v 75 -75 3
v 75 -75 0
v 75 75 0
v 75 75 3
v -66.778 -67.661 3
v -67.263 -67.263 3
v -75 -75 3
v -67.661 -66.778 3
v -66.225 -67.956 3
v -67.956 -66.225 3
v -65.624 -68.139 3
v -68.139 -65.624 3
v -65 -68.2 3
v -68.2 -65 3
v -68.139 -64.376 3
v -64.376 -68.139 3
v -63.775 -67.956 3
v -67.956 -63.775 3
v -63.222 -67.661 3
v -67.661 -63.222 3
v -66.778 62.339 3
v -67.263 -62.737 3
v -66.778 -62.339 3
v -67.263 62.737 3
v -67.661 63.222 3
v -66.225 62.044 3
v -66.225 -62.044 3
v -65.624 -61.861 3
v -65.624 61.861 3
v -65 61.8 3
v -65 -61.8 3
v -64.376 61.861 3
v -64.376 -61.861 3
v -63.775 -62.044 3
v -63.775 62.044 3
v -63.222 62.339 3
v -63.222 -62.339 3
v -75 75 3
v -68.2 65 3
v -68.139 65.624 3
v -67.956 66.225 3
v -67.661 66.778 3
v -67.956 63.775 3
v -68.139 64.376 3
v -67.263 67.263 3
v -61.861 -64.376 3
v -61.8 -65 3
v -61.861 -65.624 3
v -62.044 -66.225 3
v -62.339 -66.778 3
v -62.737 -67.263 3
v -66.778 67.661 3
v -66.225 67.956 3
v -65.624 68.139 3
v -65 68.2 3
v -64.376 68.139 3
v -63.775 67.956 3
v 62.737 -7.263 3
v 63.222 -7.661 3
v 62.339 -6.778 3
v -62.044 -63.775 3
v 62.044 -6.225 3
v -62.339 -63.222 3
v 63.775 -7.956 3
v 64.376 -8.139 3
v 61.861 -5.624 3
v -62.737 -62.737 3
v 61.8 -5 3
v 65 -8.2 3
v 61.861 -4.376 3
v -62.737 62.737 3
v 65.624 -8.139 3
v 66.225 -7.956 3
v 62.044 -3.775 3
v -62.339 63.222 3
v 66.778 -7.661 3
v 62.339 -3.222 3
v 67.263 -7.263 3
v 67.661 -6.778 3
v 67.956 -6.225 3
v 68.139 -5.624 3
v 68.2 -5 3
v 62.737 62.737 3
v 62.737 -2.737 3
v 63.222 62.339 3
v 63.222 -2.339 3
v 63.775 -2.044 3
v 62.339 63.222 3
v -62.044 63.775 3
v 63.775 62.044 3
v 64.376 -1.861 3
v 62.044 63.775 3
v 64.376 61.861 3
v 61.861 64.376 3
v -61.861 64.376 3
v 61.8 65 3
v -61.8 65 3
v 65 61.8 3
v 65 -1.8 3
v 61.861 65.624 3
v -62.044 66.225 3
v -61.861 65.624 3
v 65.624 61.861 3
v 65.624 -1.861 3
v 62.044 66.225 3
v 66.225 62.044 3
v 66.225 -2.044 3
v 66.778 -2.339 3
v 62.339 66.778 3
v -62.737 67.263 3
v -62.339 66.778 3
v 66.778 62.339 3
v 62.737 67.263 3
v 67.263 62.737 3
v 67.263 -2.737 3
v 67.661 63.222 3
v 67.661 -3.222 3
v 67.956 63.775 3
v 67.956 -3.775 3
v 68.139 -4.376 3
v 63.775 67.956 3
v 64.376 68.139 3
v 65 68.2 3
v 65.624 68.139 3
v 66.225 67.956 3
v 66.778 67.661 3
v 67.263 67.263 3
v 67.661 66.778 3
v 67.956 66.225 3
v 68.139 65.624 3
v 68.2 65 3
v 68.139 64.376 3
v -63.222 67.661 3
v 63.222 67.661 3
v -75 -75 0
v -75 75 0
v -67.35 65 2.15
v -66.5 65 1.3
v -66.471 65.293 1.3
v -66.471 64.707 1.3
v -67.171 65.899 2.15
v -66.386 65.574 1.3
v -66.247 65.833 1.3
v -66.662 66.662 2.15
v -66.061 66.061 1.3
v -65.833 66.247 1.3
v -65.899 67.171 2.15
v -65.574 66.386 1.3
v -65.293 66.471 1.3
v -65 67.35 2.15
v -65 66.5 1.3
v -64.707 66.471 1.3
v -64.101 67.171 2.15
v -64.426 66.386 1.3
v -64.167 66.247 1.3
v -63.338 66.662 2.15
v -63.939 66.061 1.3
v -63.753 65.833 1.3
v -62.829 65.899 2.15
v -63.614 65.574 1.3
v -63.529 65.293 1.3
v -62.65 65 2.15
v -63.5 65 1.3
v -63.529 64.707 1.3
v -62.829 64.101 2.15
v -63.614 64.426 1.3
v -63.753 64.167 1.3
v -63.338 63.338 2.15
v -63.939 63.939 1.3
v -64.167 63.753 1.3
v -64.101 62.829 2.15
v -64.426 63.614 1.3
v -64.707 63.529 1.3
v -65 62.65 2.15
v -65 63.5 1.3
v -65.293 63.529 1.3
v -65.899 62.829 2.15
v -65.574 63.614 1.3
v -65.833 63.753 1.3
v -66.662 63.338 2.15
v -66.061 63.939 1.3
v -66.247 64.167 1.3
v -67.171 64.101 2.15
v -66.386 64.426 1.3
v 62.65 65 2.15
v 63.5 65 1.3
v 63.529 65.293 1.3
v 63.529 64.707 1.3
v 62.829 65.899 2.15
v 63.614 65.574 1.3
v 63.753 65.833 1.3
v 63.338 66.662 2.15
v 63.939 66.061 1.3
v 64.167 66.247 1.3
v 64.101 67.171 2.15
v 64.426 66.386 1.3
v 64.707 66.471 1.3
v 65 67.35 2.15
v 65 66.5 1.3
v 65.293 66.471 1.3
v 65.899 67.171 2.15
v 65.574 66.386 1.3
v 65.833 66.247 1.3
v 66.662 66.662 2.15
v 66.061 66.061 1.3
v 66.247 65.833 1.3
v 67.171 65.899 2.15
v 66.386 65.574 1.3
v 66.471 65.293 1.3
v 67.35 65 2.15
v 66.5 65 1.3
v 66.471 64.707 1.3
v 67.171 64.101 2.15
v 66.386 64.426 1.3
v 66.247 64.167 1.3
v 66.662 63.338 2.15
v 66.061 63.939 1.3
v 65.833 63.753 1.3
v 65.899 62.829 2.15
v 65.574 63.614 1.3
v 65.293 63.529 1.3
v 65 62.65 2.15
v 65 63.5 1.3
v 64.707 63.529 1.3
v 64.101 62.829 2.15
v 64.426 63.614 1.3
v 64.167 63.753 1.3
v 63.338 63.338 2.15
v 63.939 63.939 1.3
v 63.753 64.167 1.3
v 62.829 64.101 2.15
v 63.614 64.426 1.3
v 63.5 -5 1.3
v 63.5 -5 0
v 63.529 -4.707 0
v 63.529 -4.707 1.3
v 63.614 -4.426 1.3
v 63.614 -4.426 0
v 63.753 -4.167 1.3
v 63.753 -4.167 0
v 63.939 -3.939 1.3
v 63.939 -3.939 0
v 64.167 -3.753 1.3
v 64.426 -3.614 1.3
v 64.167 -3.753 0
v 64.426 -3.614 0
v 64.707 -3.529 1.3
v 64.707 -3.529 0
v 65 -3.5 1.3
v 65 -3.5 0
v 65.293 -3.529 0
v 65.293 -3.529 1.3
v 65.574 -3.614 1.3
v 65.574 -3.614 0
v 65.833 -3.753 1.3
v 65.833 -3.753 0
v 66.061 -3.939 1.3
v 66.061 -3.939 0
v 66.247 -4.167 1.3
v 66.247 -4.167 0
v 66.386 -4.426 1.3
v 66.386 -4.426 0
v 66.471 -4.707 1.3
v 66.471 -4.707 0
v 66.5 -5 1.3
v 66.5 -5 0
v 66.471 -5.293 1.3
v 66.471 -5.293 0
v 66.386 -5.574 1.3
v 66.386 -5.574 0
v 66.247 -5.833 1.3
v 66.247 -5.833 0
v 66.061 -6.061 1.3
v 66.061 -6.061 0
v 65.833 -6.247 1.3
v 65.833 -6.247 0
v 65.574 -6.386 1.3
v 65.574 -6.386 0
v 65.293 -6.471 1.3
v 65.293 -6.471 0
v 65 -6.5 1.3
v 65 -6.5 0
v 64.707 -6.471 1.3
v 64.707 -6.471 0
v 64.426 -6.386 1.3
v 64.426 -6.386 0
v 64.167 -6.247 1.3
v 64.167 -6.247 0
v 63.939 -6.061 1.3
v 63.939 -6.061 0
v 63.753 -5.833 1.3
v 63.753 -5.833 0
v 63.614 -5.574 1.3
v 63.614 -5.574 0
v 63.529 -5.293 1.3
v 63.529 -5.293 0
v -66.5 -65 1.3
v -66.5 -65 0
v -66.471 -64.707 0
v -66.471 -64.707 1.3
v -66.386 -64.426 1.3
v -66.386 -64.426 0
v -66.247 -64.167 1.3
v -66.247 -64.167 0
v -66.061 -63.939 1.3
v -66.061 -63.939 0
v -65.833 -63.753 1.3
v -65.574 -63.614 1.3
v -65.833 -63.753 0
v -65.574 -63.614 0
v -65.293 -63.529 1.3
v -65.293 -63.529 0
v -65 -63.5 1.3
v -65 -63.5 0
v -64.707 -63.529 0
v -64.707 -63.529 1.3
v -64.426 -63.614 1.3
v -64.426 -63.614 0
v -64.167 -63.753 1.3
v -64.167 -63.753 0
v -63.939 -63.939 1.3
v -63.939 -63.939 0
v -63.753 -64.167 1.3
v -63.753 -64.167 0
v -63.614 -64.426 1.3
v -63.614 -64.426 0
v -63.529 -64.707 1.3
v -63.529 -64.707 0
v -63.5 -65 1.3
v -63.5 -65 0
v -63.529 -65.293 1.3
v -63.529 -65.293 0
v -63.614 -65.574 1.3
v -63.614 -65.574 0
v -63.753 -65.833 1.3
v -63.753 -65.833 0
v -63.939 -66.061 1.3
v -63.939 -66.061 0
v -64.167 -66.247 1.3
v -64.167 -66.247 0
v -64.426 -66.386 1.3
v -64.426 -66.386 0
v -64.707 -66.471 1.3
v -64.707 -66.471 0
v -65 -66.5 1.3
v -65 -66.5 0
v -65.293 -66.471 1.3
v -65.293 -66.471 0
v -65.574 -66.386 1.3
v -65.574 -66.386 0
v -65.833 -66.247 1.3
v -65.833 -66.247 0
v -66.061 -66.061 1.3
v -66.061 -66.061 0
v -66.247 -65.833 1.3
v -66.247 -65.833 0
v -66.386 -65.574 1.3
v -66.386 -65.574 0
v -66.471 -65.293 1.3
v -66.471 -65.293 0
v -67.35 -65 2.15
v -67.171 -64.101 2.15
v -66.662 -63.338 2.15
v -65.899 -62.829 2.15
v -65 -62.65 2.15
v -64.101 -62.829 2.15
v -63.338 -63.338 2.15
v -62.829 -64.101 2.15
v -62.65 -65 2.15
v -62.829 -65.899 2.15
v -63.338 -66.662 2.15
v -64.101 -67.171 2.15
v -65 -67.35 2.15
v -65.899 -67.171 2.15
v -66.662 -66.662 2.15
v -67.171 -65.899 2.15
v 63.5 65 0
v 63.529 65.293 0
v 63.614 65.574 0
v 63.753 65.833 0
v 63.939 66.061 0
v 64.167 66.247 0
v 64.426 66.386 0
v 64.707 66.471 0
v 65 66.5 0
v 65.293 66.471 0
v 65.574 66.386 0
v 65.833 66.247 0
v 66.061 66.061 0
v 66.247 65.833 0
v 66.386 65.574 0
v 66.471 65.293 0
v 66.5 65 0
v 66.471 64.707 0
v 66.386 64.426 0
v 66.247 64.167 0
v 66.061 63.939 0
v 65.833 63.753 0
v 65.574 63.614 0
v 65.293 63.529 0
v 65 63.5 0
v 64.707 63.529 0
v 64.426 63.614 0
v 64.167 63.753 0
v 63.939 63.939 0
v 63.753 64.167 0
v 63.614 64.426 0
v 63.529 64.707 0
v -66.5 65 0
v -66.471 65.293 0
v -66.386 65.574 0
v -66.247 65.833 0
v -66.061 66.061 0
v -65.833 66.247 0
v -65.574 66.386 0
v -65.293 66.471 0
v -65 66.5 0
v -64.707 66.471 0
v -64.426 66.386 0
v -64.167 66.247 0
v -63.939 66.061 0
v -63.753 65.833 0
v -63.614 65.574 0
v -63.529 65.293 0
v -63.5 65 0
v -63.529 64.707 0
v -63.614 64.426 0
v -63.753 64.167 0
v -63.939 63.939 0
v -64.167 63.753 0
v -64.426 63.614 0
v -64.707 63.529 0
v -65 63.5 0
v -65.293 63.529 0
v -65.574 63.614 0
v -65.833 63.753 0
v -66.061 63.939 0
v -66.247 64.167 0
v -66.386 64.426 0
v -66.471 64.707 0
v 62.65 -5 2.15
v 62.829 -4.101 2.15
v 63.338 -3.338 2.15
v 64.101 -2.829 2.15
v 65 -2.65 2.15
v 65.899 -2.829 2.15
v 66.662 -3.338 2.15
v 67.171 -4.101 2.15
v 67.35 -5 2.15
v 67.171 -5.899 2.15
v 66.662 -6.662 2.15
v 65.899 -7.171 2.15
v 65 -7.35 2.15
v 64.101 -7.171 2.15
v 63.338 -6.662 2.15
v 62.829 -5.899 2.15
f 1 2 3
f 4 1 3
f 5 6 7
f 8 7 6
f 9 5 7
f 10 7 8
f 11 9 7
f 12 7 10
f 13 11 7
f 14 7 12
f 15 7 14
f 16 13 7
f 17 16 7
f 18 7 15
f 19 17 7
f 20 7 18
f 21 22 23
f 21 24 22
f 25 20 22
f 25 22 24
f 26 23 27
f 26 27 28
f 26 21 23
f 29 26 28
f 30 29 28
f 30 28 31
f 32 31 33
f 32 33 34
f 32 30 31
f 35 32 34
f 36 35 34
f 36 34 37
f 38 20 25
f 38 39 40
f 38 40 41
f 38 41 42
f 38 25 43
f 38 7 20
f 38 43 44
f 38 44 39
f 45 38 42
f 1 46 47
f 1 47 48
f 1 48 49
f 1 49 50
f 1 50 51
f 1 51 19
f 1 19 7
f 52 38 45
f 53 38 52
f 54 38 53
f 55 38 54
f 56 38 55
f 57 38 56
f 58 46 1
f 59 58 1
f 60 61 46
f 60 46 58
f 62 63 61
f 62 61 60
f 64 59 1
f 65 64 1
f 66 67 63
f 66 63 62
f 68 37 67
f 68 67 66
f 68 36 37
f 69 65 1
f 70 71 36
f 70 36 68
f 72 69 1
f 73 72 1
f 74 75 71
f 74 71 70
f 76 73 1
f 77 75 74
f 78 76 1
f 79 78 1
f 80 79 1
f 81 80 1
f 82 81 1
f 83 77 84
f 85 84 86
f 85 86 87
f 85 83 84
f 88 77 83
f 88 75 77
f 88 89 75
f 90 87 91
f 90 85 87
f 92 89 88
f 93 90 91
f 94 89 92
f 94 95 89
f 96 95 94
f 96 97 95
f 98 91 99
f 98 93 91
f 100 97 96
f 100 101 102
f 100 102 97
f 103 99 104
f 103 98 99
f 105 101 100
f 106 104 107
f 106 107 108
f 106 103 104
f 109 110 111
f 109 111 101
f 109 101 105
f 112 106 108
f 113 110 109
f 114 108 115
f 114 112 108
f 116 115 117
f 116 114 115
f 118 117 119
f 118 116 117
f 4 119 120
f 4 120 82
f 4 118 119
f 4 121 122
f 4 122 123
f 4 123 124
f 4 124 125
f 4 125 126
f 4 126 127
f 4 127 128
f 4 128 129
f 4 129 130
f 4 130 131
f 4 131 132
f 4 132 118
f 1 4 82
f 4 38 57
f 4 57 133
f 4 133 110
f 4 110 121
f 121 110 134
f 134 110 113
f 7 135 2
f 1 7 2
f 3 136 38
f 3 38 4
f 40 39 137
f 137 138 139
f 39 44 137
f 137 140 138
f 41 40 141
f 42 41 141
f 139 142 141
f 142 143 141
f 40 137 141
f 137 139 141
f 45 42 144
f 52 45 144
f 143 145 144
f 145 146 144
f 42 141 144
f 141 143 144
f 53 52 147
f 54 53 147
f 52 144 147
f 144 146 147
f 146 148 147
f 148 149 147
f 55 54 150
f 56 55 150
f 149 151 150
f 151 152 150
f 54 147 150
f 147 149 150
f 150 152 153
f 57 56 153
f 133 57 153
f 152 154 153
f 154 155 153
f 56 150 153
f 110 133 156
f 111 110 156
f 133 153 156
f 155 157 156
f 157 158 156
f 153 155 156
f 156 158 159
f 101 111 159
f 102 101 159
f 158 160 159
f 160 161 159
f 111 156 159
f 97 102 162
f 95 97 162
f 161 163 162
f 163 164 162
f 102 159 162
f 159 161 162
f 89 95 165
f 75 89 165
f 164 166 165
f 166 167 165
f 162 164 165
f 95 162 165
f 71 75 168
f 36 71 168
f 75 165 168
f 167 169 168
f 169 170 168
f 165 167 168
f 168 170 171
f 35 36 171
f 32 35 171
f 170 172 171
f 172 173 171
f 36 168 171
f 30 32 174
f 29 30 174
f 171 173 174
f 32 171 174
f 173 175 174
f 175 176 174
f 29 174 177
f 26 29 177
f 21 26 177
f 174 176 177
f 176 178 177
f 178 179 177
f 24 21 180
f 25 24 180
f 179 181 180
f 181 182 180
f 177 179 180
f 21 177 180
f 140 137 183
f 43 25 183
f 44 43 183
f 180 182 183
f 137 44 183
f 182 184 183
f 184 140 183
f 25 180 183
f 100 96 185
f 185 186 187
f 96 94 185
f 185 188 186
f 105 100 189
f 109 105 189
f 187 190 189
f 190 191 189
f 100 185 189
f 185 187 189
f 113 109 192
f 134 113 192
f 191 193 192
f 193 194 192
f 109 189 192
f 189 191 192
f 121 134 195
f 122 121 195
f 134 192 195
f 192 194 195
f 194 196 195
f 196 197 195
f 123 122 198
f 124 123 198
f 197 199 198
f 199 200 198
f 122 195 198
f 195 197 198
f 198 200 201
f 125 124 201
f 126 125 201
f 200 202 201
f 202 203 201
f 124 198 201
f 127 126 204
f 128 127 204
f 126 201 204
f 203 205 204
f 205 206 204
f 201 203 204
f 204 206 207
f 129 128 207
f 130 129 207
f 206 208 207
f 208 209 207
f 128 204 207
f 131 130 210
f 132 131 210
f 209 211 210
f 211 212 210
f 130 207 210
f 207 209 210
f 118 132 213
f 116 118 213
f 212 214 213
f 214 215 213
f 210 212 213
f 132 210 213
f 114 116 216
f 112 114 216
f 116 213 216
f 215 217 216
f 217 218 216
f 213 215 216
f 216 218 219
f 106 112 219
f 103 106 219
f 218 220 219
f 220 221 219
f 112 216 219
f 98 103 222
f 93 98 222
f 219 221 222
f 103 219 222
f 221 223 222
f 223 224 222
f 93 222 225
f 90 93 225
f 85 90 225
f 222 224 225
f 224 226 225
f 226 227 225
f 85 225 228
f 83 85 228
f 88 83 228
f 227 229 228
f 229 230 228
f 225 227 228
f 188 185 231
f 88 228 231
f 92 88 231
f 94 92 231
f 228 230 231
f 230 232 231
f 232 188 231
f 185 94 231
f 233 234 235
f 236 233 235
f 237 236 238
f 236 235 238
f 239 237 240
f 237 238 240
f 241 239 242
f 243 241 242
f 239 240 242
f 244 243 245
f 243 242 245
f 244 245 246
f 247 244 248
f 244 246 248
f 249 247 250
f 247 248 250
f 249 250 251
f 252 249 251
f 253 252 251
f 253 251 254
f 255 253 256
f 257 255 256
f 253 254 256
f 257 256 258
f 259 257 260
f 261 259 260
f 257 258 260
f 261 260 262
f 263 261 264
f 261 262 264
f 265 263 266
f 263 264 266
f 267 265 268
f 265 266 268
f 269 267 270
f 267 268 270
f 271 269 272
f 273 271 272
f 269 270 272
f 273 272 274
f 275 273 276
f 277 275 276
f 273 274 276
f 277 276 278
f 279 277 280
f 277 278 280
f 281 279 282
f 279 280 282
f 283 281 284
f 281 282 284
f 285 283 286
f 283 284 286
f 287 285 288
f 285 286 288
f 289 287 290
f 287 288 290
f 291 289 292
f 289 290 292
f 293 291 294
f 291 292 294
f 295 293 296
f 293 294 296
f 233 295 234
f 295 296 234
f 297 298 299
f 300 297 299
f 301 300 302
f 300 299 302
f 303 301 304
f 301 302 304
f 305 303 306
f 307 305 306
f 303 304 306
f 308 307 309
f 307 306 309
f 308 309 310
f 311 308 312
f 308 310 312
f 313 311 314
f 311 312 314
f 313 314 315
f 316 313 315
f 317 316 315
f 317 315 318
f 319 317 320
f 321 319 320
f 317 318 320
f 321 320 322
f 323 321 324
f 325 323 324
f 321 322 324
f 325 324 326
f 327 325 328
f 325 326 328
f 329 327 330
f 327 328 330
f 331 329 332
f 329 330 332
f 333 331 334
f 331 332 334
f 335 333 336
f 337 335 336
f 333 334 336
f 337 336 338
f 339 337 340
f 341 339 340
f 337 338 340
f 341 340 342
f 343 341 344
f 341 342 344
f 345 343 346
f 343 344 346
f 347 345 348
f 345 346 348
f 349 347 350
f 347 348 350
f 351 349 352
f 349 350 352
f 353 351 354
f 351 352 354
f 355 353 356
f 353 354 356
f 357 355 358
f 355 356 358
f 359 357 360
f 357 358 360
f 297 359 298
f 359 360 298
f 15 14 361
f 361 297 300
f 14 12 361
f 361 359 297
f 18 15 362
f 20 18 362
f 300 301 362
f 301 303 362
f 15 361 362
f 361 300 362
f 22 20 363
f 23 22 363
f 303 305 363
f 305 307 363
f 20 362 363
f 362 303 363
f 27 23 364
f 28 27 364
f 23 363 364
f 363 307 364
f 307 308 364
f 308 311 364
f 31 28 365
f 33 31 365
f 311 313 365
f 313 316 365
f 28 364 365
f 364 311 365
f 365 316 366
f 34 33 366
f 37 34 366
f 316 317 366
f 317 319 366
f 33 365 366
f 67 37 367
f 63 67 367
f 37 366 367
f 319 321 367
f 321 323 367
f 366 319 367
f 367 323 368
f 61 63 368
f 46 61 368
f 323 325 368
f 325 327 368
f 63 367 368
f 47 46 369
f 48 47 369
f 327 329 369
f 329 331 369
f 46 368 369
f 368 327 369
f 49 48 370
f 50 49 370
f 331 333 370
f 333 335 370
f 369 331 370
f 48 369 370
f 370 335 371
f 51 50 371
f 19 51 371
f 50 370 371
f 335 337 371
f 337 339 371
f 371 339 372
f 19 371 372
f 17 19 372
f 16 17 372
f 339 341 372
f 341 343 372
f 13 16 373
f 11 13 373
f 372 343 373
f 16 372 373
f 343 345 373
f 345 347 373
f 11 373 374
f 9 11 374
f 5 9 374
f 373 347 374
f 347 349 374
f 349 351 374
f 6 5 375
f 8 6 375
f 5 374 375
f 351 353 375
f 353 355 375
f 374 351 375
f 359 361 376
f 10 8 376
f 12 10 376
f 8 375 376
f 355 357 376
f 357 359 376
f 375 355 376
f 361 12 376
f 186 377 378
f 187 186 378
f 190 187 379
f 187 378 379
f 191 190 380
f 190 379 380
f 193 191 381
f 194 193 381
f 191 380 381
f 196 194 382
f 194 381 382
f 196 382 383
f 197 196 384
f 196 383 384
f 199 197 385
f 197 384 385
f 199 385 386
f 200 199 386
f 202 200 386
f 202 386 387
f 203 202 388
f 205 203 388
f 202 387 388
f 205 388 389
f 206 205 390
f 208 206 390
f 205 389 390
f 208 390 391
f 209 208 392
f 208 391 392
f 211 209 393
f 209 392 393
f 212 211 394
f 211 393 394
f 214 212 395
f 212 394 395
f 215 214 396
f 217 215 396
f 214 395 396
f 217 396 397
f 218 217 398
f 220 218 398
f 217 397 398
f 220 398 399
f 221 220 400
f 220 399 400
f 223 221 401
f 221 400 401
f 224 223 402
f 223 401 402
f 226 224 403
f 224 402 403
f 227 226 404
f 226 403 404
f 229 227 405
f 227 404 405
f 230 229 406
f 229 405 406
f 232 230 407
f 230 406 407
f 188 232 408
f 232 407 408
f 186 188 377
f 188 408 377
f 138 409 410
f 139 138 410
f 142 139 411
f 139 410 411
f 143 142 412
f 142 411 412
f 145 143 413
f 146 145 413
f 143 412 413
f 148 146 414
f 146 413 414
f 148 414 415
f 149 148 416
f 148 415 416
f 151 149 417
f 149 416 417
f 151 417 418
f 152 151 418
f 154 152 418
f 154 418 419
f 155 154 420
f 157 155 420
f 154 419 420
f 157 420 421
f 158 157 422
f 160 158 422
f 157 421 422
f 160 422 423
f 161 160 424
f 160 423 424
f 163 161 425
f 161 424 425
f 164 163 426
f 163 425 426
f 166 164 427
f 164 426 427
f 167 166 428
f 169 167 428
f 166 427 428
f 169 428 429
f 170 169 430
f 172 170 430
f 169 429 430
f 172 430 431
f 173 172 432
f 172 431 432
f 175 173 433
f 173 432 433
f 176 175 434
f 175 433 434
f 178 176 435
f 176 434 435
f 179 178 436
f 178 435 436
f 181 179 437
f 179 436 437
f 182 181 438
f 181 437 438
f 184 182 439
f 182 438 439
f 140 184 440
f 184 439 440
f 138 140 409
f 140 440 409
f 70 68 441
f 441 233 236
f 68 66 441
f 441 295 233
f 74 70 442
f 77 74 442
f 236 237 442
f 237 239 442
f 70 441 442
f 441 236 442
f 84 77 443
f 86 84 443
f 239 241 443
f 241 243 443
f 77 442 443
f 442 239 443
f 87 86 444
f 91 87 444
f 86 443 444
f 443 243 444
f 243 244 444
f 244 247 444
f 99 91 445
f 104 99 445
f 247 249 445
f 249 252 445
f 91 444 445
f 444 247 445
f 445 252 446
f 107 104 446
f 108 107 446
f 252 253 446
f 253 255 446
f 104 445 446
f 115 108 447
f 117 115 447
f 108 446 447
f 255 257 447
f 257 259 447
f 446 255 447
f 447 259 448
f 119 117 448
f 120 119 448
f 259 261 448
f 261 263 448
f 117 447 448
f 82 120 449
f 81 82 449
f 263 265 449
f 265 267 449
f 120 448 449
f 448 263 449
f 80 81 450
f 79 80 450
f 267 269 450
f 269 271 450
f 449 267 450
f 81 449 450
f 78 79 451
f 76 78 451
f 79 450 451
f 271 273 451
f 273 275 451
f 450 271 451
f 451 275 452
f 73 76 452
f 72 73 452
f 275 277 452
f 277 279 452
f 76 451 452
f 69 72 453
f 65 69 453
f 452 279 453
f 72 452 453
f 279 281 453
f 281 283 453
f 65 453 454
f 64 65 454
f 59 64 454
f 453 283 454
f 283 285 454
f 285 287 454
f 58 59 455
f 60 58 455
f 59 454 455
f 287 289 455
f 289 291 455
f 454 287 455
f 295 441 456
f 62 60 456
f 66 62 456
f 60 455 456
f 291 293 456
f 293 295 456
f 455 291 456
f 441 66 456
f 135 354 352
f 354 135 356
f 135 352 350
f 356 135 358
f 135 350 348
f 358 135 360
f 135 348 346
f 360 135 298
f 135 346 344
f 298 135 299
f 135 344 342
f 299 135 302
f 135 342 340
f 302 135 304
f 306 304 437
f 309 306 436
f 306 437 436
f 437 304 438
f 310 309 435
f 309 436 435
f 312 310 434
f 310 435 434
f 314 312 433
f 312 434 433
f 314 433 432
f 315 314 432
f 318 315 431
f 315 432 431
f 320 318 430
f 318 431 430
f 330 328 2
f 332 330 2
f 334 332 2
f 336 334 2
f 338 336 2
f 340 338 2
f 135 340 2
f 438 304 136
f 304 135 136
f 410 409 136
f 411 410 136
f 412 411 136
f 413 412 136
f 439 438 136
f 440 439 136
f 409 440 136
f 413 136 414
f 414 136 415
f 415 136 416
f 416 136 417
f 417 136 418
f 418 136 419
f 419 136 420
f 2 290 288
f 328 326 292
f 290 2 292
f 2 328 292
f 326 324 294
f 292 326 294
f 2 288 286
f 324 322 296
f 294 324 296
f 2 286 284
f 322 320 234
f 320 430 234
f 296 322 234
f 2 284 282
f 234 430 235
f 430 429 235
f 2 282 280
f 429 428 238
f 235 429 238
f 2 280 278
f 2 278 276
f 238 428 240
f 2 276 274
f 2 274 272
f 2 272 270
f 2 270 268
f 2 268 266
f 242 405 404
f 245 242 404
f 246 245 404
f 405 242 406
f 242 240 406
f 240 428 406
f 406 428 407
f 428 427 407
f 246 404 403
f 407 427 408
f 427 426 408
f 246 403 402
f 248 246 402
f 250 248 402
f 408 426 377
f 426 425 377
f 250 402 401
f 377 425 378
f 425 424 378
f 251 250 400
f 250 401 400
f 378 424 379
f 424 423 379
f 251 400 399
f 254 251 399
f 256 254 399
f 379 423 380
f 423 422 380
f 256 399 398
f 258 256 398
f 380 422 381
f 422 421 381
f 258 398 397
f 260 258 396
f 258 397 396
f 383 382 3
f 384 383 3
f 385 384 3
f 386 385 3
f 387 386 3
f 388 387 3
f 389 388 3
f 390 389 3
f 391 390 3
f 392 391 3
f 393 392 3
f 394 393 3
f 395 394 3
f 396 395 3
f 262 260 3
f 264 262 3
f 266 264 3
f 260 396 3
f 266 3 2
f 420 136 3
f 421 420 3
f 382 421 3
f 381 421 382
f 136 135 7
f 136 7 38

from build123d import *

# Parameters (mm, degrees)
ESBO_O1_W                = 150
ESBO_O1_H                = 150
RESSALTO_EXTRUS_O1_DEPTH = 3
ESBO_O2_R                = 1.5
CORTE_EXTRUS_O1_DEPTH    = 3
CHANFRO1_SIZE            = 1.7


with BuildPart() as part:
    # Esboço1 → Ressalto-extrusão1 (new body)
    with BuildSketch(Plane.XY):
        Rectangle(ESBO_O1_W, ESBO_O1_H)
    extrude(amount=RESSALTO_EXTRUS_O1_DEPTH)

    # Esboço2 → Corte-extrusão1 (cut)
    with BuildSketch(Plane(origin=(0, 0, 0), x_dir=(-1, 0, 0), z_dir=(0, 0, -1))):
        with Locations((65, -65)):
            Circle(ESBO_O2_R)
        with Locations((65, 65)):
            Circle(ESBO_O2_R)
        with Locations((-65, 65)):
            Circle(ESBO_O2_R)
        with Locations((-65, -5)):
            Circle(ESBO_O2_R)
    extrude(amount=-CORTE_EXTRUS_O1_DEPTH, mode=Mode.SUBTRACT)

    # Chanfro1
    chanfro1_edges = [part.edges().sort_by_distance(p)[0] for p in [
        (-63.5, -65, 3),
        (-63.5, 65, 3),
        (66.5, 65, 3),
        (66.5, -5, 3),
    ]]
    chamfer(chanfro1_edges, length=CHANFRO1_SIZE)


solid = part.part
